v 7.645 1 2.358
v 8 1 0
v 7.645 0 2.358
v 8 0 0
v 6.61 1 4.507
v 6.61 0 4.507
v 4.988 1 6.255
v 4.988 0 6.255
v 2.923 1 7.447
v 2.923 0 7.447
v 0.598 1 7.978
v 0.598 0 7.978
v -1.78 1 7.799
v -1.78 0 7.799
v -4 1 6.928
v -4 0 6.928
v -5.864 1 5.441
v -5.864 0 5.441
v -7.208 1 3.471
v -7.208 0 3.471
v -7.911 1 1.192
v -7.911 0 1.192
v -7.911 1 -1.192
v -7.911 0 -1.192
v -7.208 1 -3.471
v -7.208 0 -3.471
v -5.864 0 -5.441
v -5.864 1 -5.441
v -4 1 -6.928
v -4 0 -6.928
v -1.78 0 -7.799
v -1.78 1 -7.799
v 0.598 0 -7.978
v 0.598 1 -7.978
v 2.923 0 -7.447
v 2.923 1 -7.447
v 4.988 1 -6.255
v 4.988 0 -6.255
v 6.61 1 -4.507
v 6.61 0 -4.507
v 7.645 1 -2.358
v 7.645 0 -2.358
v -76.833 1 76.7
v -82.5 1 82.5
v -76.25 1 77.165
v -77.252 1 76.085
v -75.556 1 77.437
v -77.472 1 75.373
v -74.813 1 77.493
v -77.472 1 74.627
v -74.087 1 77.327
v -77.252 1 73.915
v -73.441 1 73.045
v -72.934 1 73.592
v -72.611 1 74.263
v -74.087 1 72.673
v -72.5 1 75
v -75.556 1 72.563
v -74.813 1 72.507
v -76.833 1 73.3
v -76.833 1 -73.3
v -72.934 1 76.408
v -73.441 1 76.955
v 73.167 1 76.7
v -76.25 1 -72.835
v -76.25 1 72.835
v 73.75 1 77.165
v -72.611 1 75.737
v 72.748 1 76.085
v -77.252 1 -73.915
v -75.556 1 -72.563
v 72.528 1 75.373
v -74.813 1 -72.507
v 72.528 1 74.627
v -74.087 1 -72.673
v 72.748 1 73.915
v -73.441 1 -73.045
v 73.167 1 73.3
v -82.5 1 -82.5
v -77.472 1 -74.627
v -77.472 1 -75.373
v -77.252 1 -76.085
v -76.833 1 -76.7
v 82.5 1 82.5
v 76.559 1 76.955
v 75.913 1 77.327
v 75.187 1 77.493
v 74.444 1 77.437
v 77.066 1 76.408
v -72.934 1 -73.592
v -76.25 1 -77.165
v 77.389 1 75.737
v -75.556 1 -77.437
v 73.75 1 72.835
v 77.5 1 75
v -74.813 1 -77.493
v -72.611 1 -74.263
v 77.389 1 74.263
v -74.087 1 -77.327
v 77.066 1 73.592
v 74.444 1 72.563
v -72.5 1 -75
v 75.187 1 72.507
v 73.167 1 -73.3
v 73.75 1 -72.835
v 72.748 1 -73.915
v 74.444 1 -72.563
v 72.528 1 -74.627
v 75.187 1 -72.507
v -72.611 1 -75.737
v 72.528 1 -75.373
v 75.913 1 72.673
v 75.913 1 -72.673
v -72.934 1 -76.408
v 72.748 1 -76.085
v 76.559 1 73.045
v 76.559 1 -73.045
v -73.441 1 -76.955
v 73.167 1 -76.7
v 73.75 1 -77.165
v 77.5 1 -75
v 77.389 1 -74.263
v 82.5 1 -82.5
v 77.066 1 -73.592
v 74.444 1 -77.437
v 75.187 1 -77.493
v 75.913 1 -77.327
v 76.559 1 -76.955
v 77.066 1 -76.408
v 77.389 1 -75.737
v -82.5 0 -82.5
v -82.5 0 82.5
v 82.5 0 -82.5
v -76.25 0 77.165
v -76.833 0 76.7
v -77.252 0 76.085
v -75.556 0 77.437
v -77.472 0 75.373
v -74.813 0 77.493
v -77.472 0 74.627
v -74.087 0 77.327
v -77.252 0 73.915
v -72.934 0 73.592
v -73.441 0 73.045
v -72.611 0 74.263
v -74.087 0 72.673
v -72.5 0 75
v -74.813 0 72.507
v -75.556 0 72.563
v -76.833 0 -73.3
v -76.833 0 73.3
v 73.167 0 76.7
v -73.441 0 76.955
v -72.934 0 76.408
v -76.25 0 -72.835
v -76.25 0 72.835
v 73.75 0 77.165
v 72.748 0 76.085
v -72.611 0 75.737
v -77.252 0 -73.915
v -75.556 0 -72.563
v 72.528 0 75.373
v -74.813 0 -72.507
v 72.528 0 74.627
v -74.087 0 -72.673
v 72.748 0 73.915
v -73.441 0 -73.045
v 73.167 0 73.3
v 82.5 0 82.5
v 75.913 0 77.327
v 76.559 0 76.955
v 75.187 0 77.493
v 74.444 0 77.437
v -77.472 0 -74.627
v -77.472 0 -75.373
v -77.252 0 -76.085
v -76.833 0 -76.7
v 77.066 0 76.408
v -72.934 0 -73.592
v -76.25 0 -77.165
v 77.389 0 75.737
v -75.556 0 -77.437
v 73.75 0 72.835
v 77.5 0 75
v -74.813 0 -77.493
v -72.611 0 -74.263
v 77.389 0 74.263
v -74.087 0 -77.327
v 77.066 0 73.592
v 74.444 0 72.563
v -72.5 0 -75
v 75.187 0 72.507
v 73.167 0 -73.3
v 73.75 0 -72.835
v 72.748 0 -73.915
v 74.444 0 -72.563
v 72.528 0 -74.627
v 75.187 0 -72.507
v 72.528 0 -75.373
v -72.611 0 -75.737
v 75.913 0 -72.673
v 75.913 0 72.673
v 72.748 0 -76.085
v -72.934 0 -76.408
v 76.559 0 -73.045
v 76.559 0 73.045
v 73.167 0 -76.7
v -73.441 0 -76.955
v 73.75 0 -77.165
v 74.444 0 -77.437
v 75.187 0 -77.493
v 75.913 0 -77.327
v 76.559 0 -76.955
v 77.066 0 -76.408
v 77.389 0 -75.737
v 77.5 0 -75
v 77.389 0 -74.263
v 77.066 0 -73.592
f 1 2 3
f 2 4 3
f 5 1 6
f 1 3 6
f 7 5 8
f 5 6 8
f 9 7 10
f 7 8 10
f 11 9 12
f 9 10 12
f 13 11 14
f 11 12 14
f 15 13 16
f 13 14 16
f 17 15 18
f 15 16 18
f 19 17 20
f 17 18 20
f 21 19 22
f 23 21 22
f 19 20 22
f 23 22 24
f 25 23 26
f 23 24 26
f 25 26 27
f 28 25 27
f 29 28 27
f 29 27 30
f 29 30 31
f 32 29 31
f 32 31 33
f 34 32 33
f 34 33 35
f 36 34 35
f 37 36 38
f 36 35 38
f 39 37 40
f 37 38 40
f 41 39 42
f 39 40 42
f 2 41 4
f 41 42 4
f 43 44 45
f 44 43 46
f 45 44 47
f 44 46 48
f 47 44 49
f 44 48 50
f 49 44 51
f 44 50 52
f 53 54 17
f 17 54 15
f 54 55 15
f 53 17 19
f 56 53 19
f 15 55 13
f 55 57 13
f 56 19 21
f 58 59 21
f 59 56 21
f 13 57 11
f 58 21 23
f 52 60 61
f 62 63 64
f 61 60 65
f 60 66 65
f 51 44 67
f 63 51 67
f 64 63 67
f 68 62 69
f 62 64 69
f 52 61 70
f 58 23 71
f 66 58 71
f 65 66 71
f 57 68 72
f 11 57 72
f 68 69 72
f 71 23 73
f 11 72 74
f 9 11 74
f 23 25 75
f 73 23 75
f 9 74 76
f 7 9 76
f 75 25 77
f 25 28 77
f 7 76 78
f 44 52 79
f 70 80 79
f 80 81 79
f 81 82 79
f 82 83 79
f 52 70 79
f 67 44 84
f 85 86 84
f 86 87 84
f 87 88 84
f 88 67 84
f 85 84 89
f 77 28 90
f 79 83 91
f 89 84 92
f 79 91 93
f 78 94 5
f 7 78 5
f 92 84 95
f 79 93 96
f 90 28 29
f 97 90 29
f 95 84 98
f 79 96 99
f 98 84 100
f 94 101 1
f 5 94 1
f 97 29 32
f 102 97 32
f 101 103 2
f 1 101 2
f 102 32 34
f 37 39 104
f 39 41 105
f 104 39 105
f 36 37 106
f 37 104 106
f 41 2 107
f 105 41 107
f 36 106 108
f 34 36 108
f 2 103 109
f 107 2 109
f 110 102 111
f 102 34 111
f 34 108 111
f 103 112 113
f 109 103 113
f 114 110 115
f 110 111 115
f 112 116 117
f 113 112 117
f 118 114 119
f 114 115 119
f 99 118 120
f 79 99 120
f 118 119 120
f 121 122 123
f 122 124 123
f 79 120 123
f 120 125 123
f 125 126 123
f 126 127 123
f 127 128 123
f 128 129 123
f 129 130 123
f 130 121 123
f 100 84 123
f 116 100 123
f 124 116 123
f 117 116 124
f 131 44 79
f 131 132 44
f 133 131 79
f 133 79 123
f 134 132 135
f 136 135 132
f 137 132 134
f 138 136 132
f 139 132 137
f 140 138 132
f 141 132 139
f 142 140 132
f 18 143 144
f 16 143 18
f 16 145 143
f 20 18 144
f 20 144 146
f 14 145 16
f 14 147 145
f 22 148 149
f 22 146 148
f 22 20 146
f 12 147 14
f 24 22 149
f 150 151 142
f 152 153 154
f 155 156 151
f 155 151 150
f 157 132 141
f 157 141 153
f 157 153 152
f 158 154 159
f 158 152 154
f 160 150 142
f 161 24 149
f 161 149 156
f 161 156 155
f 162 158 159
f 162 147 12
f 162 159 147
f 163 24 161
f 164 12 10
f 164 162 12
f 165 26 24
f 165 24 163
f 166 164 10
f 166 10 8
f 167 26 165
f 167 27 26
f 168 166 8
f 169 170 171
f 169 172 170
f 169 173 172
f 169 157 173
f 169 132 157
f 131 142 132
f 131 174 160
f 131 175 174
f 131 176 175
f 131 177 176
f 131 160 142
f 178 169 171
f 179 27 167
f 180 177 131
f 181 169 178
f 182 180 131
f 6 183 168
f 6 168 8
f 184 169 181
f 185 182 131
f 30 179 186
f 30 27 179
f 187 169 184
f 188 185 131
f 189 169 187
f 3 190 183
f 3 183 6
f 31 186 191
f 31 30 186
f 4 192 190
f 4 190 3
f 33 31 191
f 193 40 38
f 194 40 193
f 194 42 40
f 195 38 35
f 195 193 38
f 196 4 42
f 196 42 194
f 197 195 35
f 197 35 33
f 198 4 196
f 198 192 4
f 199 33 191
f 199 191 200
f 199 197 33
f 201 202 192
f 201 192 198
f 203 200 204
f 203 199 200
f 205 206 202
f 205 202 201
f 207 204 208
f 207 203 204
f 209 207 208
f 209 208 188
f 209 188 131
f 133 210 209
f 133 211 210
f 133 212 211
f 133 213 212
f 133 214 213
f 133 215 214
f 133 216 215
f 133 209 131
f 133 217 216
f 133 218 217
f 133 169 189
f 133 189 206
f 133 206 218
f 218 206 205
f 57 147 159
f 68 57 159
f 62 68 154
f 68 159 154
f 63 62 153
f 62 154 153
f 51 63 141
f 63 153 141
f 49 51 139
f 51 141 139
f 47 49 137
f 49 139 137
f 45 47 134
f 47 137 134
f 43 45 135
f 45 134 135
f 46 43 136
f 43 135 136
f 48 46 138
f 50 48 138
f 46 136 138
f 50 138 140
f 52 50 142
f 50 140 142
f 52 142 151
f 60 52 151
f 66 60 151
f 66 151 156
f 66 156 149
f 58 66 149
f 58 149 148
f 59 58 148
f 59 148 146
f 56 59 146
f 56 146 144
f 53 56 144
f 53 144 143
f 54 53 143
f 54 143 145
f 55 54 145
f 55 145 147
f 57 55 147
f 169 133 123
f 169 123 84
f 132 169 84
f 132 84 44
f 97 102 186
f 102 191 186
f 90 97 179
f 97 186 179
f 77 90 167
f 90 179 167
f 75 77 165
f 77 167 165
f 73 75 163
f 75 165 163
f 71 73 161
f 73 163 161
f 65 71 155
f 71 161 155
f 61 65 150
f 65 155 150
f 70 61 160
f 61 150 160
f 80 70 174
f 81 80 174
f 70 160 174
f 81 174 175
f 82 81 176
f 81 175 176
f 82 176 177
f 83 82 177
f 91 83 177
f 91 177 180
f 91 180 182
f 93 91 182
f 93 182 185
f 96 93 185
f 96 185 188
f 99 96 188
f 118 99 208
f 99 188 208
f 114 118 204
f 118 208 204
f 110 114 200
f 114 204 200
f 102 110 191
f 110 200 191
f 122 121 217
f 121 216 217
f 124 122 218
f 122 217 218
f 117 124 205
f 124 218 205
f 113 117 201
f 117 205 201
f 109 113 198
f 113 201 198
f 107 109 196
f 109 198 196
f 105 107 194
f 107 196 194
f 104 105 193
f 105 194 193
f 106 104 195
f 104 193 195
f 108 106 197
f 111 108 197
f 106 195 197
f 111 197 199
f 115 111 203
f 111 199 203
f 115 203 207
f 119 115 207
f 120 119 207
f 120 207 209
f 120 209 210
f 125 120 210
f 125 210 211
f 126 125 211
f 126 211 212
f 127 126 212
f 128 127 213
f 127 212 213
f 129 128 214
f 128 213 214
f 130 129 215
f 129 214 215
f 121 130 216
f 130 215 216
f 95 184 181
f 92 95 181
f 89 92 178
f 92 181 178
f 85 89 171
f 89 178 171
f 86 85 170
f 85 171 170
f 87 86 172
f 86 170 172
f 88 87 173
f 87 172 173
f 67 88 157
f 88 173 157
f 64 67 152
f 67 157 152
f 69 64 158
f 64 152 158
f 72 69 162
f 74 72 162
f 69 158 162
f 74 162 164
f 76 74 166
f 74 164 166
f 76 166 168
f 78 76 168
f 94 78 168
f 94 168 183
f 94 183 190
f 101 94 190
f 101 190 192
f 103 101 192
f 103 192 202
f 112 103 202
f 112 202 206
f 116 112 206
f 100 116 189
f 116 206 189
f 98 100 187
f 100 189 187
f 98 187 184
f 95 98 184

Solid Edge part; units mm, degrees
sketch "Sketch1" plane through (0, 0, 0) normal (0, -1, 0) x (1, 0, 0)
  line L0 (-82.5, -82.5) -> (82.5, -82.5)
  line L1 (82.5, -82.5) -> (82.5, 82.5)
  line L2 (82.5, 82.5) -> (-82.5, 82.5)
  line L3 (-82.5, 82.5) -> (-82.5, -82.5)
  circle A0 centre (0, 0) radius 2
  dimension "D1" = 165
extrude "Protrusion1" add sketch "Sketch1" against normal blind 1
sketch "Sketch2" plane through (0, 0, 0) normal (0, -1, 0) x (1, 0, 0)
  circle A0 centre (0, 0) radius 8
extrude "Cutout1" cut sketch "Sketch2" against normal through all
sketch "Sketch3" plane through (0, 0, 0) normal (0, -1, 0) x (1, 0, 0)
  circle A0 centre (-75, 75) radius 2.5
  circle A1 centre (75, 75) radius 2.5
  circle A2 centre (75, -75) radius 2.5
  circle A3 centre (-75, -75) radius 2.5
  dimension "D1" = 165
extrude "Cutout2" cut sketch "Sketch3" against normal through all
properties material "Aluminum, 1060"
